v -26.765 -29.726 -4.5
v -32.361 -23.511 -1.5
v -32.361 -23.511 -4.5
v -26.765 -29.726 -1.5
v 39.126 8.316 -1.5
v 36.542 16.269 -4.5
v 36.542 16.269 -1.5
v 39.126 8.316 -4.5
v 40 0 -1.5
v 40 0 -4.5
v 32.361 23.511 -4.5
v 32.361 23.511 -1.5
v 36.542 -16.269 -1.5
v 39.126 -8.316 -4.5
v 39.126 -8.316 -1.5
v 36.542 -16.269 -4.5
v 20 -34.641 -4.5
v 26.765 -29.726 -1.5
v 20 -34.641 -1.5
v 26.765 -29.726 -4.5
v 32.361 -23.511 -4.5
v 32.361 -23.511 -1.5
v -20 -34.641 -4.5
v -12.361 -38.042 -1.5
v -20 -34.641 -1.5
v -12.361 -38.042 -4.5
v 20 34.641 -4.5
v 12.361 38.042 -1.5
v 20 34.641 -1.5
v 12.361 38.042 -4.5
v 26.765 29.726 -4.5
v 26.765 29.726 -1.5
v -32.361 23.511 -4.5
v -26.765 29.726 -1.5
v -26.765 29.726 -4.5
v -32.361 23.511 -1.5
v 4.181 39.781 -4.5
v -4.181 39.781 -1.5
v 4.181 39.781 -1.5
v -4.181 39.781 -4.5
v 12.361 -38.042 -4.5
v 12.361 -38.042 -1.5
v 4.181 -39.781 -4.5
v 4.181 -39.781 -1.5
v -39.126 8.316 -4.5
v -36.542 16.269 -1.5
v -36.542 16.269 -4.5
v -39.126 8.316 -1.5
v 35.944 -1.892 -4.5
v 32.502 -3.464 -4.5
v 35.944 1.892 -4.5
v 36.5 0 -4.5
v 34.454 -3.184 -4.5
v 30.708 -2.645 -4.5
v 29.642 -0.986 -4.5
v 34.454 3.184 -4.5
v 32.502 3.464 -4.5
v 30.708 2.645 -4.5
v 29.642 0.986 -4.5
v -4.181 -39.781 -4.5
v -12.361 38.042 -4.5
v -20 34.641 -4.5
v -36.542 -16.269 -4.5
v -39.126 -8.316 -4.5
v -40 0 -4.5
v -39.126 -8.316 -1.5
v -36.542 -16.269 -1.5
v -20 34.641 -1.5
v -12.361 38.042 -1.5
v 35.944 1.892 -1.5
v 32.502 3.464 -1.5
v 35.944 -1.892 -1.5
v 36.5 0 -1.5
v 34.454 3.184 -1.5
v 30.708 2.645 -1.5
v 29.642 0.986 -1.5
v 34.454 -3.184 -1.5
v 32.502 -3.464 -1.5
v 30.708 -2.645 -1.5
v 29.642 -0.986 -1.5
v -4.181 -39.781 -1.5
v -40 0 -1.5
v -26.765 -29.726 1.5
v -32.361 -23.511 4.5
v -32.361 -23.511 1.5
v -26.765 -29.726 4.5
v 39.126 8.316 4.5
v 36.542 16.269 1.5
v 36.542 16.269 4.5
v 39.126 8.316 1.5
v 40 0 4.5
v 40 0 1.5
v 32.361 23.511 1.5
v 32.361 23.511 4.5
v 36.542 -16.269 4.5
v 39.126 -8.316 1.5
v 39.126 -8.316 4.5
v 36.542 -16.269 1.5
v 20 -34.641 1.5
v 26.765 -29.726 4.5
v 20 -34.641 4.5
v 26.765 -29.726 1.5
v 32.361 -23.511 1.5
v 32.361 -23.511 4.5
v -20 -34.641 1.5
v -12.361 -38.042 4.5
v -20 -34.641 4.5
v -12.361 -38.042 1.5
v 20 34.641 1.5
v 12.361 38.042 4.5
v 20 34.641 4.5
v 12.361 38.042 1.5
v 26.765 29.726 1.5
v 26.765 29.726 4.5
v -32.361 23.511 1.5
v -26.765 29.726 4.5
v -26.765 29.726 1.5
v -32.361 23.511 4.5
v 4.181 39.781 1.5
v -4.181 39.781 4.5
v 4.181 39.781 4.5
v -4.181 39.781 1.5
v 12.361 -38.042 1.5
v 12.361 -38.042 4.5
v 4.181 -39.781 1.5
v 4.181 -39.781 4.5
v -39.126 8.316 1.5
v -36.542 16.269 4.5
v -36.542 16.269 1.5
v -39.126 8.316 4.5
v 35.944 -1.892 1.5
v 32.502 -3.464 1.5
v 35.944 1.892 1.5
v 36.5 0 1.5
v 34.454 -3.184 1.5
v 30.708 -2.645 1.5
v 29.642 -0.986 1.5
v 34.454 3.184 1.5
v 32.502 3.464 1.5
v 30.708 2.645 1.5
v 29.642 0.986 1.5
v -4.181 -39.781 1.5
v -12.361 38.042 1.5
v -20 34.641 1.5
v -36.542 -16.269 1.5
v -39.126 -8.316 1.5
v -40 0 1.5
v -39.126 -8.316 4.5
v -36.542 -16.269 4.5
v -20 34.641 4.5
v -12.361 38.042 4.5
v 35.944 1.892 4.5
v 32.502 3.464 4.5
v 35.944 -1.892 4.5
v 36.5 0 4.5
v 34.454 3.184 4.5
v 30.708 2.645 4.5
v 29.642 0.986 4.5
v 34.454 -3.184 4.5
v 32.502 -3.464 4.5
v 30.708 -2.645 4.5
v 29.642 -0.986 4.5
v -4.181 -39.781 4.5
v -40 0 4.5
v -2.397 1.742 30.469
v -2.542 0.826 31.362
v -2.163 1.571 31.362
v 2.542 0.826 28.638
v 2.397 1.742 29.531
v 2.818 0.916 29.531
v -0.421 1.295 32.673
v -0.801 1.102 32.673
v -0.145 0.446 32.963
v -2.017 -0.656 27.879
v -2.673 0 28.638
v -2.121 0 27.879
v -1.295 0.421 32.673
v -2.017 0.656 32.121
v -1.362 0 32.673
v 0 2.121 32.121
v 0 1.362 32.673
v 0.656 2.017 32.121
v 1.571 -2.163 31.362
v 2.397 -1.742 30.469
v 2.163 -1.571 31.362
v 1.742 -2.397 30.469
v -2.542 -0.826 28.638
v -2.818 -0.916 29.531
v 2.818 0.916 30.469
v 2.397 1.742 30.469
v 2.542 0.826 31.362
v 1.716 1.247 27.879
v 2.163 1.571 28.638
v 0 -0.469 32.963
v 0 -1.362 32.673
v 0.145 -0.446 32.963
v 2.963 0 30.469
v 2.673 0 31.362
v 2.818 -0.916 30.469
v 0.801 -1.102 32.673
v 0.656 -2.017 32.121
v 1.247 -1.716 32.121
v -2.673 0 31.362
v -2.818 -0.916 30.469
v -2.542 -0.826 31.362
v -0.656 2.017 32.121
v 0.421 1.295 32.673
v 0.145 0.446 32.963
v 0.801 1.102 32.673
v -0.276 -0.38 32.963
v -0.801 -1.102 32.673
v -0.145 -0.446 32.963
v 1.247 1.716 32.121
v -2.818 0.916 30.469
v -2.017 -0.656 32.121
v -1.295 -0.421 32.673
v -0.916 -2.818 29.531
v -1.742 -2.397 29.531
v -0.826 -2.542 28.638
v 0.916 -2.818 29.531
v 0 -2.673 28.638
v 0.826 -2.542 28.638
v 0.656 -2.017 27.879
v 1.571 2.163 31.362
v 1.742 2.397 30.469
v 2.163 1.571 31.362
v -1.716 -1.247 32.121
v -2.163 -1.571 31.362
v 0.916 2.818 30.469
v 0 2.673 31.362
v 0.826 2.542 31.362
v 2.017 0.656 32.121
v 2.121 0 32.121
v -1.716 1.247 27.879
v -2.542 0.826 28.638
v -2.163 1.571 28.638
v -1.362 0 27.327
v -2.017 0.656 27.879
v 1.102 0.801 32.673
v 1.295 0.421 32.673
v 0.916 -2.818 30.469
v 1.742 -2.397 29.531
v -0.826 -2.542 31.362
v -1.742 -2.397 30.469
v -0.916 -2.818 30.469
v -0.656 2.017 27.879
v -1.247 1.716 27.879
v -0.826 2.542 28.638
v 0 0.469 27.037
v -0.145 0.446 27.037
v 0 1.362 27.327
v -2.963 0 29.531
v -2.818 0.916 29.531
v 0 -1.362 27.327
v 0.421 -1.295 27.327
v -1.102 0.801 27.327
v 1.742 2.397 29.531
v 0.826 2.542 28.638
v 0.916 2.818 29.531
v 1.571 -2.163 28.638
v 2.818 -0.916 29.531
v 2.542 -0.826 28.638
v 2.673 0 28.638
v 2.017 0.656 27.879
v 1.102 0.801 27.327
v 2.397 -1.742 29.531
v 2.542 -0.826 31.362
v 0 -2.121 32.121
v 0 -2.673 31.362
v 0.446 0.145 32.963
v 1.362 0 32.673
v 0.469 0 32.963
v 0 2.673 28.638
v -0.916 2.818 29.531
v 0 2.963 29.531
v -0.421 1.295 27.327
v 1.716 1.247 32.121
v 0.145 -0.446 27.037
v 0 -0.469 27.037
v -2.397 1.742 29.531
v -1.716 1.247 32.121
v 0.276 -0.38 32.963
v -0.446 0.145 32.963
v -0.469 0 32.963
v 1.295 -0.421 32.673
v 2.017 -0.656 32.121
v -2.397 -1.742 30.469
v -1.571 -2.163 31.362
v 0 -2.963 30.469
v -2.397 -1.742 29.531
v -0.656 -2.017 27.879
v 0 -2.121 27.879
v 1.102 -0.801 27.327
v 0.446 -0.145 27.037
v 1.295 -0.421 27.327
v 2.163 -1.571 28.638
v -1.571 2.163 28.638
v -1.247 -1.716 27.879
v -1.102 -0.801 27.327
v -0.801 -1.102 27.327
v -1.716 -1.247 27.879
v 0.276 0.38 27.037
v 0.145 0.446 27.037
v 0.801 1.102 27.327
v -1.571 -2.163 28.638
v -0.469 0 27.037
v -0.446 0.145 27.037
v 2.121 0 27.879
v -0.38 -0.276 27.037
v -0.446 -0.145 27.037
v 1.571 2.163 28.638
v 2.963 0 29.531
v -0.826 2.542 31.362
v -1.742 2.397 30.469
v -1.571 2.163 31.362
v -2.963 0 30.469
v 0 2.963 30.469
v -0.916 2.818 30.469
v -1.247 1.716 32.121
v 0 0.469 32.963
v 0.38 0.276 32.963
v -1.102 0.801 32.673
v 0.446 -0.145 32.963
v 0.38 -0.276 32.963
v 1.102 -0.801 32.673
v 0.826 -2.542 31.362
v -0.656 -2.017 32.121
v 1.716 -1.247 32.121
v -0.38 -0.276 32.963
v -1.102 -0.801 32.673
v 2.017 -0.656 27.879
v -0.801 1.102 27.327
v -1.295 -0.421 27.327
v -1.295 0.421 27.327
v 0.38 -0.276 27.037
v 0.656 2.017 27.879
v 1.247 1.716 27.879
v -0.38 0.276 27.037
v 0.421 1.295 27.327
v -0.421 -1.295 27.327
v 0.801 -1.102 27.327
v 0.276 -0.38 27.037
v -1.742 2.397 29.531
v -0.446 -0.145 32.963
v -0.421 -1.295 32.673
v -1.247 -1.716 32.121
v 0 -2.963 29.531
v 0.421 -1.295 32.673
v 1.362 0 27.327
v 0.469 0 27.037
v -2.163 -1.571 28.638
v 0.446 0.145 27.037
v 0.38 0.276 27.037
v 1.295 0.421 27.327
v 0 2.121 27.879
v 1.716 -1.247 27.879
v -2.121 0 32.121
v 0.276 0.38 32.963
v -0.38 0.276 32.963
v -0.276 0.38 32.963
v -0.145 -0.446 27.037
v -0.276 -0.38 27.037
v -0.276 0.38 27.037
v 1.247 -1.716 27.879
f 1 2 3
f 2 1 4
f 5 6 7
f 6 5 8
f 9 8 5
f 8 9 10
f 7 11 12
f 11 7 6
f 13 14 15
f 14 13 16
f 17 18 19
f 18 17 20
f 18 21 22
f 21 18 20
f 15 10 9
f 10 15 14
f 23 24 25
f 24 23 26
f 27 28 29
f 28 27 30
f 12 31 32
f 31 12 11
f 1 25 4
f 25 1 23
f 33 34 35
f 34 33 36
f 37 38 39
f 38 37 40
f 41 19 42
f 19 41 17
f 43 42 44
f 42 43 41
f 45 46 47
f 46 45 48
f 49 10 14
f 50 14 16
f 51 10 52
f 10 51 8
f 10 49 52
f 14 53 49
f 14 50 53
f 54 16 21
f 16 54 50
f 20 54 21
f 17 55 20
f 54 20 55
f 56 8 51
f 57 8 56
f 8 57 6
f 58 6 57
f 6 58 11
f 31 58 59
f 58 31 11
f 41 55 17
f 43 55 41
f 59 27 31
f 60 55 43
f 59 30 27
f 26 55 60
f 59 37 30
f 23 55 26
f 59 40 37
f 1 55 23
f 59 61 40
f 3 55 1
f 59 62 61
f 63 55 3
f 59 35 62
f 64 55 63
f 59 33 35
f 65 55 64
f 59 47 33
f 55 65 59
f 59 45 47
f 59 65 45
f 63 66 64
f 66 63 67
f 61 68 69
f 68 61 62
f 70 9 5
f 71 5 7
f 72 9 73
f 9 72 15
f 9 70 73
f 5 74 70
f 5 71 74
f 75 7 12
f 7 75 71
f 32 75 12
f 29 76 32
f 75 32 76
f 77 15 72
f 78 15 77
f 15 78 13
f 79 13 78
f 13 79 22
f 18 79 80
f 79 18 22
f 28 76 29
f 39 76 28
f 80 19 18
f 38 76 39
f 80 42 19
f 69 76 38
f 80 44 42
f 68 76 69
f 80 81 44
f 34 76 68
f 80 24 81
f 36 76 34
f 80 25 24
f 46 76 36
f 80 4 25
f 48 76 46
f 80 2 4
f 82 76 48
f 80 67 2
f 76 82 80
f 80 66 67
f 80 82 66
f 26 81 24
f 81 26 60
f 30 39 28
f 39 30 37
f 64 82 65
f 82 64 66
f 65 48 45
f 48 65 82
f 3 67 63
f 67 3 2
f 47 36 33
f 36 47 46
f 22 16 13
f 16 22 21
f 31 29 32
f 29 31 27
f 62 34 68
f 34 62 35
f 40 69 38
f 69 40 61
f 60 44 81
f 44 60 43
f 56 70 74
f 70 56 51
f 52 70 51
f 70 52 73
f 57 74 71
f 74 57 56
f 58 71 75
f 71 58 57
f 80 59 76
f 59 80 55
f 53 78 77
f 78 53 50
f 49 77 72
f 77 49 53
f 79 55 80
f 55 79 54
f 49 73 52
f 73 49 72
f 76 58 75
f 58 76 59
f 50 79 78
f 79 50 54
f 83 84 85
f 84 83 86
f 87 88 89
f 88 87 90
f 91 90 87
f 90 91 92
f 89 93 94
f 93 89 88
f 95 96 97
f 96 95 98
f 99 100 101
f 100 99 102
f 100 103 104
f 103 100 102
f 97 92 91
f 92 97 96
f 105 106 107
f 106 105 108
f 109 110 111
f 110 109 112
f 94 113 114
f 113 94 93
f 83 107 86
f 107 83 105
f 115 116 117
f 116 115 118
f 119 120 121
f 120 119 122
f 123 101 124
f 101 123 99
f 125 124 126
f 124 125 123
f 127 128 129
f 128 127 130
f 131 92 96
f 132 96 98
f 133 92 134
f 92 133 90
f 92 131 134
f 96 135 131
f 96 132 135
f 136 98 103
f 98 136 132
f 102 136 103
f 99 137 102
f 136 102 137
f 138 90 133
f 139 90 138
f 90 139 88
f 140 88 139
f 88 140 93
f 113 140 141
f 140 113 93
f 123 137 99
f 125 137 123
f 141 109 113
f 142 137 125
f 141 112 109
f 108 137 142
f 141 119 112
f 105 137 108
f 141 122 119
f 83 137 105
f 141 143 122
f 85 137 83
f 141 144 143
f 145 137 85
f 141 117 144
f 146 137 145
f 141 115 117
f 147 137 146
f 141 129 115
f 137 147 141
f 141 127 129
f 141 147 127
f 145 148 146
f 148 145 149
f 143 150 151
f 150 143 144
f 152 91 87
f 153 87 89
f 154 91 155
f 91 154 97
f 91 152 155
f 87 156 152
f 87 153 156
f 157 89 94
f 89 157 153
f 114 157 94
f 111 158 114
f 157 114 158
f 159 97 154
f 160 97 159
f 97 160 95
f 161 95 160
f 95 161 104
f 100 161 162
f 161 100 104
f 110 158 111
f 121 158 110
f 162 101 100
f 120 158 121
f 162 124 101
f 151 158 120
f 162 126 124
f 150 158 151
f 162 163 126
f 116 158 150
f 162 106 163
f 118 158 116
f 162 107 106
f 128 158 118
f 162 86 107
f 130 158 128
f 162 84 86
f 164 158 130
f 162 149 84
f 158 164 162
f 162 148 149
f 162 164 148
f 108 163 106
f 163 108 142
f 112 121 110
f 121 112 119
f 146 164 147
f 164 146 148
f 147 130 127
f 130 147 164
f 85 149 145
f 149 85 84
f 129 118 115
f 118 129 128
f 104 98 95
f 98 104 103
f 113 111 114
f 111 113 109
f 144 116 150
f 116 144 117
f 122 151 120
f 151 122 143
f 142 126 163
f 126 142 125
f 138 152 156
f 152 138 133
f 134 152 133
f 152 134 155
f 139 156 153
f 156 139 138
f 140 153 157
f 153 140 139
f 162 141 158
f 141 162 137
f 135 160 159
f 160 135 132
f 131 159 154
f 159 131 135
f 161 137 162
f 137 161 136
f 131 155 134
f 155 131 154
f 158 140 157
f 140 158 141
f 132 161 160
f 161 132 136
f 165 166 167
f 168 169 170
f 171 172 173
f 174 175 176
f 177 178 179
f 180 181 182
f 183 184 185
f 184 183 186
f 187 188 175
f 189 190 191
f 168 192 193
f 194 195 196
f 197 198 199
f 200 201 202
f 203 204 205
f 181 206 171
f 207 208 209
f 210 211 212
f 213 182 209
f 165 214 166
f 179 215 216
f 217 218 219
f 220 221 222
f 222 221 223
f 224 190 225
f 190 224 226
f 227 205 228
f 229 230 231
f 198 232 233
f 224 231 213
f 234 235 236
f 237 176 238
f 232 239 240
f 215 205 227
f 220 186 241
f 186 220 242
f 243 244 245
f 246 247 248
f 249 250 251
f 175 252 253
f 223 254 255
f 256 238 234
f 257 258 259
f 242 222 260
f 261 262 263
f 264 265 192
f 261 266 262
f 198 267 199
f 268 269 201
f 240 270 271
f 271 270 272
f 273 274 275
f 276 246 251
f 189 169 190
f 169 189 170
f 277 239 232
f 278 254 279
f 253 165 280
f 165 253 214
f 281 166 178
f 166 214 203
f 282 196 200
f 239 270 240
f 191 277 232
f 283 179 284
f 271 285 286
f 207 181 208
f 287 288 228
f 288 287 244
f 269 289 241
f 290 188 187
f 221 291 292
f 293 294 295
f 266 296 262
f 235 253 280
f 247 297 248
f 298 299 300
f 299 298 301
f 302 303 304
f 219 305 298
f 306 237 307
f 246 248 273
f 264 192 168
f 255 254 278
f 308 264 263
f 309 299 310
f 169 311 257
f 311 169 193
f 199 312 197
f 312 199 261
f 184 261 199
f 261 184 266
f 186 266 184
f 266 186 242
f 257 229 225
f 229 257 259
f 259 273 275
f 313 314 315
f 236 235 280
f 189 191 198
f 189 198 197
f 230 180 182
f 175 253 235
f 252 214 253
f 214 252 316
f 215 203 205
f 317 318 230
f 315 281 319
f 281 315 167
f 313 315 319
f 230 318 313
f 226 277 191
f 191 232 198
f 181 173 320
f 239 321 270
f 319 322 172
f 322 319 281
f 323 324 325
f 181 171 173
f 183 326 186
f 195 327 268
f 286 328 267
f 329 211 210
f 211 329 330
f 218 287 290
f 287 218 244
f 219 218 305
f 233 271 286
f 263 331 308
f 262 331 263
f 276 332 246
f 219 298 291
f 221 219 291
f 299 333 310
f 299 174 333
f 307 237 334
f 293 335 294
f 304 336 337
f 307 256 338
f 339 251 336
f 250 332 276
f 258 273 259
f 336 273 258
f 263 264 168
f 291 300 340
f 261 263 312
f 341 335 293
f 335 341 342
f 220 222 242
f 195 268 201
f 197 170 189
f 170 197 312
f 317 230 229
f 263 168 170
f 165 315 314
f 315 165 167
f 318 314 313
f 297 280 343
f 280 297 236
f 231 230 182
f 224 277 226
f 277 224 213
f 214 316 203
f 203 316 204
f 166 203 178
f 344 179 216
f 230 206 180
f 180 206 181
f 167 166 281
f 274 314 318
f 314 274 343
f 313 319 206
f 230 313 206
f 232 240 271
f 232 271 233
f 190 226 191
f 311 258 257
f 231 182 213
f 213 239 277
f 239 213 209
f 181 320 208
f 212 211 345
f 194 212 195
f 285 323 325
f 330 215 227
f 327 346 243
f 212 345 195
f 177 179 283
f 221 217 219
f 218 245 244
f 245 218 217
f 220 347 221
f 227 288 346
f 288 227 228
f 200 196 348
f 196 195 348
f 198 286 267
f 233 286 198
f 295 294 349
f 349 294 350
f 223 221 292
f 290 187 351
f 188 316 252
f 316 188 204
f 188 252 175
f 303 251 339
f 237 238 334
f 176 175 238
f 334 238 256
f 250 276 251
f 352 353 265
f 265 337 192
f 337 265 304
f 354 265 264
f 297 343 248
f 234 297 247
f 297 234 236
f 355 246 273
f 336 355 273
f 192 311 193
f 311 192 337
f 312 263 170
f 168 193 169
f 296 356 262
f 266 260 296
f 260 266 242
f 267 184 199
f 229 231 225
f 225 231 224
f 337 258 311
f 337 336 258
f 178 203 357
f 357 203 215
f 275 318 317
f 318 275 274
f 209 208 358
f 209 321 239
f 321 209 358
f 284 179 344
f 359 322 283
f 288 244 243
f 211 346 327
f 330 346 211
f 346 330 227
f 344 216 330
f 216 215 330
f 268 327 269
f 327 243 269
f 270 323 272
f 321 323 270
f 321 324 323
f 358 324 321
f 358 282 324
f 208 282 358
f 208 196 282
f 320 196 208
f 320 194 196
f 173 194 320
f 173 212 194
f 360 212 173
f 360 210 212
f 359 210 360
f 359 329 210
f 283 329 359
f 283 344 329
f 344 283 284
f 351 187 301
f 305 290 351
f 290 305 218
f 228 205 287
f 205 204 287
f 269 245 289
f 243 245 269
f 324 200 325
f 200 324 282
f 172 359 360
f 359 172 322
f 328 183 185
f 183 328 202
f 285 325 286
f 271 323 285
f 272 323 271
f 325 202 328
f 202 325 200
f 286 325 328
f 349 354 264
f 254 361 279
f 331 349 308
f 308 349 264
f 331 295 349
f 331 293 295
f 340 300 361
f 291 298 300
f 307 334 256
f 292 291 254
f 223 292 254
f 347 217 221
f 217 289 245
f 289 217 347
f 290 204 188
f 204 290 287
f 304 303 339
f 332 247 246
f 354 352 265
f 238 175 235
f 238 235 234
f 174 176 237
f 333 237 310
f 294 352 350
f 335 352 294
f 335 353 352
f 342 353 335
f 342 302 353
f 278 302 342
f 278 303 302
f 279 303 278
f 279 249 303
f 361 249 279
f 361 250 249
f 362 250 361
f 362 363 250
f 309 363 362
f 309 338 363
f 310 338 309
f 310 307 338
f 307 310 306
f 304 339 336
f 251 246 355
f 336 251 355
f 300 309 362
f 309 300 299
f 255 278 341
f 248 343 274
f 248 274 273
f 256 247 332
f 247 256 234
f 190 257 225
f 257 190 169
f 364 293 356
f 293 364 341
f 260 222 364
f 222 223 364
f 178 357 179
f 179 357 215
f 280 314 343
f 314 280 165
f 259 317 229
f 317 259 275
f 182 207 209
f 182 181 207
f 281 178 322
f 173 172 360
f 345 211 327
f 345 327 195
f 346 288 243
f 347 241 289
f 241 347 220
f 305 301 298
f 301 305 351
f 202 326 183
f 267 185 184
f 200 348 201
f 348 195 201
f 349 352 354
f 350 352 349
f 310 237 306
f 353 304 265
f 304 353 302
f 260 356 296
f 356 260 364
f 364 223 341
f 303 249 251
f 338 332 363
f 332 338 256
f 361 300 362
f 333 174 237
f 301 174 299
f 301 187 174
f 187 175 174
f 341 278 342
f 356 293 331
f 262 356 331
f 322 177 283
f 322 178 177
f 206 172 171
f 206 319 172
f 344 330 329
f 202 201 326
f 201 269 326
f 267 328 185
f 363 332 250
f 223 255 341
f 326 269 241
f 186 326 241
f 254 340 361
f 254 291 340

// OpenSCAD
main_disk_D = 80;
main_disk_h = 3;

main_disk_hole_D = 7;

main_disk_hole_offset = (main_disk_D / 2) - main_disk_hole_D;

pellet_D = 6;
pellet_h = 30;

pellet_Z = 0;

	pellet_Z = pellet_h - (($t ) * pellet_h);

gen_main_disk(-main_disk_h, 0);
gen_main_disk(-main_disk_h + pellet_D, $t*20);

translate([0, 0, pellet_Z]) color("red")
	sphere(r = pellet_D / 2, $fn = 20, center = true);

$vpr = $t;

module gen_main_disk(distance_Z, a) {
	translate([0, 0, distance_Z]) rotate([0, 0, a]) difference() {
		cylinder(h = main_disk_h, r=main_disk_D / 2, center=true);
		translate([main_disk_hole_offset,0,0])
			cylinder(h = main_disk_h + 0.1, r=main_disk_hole_D / 2, center=true);
	}
}
